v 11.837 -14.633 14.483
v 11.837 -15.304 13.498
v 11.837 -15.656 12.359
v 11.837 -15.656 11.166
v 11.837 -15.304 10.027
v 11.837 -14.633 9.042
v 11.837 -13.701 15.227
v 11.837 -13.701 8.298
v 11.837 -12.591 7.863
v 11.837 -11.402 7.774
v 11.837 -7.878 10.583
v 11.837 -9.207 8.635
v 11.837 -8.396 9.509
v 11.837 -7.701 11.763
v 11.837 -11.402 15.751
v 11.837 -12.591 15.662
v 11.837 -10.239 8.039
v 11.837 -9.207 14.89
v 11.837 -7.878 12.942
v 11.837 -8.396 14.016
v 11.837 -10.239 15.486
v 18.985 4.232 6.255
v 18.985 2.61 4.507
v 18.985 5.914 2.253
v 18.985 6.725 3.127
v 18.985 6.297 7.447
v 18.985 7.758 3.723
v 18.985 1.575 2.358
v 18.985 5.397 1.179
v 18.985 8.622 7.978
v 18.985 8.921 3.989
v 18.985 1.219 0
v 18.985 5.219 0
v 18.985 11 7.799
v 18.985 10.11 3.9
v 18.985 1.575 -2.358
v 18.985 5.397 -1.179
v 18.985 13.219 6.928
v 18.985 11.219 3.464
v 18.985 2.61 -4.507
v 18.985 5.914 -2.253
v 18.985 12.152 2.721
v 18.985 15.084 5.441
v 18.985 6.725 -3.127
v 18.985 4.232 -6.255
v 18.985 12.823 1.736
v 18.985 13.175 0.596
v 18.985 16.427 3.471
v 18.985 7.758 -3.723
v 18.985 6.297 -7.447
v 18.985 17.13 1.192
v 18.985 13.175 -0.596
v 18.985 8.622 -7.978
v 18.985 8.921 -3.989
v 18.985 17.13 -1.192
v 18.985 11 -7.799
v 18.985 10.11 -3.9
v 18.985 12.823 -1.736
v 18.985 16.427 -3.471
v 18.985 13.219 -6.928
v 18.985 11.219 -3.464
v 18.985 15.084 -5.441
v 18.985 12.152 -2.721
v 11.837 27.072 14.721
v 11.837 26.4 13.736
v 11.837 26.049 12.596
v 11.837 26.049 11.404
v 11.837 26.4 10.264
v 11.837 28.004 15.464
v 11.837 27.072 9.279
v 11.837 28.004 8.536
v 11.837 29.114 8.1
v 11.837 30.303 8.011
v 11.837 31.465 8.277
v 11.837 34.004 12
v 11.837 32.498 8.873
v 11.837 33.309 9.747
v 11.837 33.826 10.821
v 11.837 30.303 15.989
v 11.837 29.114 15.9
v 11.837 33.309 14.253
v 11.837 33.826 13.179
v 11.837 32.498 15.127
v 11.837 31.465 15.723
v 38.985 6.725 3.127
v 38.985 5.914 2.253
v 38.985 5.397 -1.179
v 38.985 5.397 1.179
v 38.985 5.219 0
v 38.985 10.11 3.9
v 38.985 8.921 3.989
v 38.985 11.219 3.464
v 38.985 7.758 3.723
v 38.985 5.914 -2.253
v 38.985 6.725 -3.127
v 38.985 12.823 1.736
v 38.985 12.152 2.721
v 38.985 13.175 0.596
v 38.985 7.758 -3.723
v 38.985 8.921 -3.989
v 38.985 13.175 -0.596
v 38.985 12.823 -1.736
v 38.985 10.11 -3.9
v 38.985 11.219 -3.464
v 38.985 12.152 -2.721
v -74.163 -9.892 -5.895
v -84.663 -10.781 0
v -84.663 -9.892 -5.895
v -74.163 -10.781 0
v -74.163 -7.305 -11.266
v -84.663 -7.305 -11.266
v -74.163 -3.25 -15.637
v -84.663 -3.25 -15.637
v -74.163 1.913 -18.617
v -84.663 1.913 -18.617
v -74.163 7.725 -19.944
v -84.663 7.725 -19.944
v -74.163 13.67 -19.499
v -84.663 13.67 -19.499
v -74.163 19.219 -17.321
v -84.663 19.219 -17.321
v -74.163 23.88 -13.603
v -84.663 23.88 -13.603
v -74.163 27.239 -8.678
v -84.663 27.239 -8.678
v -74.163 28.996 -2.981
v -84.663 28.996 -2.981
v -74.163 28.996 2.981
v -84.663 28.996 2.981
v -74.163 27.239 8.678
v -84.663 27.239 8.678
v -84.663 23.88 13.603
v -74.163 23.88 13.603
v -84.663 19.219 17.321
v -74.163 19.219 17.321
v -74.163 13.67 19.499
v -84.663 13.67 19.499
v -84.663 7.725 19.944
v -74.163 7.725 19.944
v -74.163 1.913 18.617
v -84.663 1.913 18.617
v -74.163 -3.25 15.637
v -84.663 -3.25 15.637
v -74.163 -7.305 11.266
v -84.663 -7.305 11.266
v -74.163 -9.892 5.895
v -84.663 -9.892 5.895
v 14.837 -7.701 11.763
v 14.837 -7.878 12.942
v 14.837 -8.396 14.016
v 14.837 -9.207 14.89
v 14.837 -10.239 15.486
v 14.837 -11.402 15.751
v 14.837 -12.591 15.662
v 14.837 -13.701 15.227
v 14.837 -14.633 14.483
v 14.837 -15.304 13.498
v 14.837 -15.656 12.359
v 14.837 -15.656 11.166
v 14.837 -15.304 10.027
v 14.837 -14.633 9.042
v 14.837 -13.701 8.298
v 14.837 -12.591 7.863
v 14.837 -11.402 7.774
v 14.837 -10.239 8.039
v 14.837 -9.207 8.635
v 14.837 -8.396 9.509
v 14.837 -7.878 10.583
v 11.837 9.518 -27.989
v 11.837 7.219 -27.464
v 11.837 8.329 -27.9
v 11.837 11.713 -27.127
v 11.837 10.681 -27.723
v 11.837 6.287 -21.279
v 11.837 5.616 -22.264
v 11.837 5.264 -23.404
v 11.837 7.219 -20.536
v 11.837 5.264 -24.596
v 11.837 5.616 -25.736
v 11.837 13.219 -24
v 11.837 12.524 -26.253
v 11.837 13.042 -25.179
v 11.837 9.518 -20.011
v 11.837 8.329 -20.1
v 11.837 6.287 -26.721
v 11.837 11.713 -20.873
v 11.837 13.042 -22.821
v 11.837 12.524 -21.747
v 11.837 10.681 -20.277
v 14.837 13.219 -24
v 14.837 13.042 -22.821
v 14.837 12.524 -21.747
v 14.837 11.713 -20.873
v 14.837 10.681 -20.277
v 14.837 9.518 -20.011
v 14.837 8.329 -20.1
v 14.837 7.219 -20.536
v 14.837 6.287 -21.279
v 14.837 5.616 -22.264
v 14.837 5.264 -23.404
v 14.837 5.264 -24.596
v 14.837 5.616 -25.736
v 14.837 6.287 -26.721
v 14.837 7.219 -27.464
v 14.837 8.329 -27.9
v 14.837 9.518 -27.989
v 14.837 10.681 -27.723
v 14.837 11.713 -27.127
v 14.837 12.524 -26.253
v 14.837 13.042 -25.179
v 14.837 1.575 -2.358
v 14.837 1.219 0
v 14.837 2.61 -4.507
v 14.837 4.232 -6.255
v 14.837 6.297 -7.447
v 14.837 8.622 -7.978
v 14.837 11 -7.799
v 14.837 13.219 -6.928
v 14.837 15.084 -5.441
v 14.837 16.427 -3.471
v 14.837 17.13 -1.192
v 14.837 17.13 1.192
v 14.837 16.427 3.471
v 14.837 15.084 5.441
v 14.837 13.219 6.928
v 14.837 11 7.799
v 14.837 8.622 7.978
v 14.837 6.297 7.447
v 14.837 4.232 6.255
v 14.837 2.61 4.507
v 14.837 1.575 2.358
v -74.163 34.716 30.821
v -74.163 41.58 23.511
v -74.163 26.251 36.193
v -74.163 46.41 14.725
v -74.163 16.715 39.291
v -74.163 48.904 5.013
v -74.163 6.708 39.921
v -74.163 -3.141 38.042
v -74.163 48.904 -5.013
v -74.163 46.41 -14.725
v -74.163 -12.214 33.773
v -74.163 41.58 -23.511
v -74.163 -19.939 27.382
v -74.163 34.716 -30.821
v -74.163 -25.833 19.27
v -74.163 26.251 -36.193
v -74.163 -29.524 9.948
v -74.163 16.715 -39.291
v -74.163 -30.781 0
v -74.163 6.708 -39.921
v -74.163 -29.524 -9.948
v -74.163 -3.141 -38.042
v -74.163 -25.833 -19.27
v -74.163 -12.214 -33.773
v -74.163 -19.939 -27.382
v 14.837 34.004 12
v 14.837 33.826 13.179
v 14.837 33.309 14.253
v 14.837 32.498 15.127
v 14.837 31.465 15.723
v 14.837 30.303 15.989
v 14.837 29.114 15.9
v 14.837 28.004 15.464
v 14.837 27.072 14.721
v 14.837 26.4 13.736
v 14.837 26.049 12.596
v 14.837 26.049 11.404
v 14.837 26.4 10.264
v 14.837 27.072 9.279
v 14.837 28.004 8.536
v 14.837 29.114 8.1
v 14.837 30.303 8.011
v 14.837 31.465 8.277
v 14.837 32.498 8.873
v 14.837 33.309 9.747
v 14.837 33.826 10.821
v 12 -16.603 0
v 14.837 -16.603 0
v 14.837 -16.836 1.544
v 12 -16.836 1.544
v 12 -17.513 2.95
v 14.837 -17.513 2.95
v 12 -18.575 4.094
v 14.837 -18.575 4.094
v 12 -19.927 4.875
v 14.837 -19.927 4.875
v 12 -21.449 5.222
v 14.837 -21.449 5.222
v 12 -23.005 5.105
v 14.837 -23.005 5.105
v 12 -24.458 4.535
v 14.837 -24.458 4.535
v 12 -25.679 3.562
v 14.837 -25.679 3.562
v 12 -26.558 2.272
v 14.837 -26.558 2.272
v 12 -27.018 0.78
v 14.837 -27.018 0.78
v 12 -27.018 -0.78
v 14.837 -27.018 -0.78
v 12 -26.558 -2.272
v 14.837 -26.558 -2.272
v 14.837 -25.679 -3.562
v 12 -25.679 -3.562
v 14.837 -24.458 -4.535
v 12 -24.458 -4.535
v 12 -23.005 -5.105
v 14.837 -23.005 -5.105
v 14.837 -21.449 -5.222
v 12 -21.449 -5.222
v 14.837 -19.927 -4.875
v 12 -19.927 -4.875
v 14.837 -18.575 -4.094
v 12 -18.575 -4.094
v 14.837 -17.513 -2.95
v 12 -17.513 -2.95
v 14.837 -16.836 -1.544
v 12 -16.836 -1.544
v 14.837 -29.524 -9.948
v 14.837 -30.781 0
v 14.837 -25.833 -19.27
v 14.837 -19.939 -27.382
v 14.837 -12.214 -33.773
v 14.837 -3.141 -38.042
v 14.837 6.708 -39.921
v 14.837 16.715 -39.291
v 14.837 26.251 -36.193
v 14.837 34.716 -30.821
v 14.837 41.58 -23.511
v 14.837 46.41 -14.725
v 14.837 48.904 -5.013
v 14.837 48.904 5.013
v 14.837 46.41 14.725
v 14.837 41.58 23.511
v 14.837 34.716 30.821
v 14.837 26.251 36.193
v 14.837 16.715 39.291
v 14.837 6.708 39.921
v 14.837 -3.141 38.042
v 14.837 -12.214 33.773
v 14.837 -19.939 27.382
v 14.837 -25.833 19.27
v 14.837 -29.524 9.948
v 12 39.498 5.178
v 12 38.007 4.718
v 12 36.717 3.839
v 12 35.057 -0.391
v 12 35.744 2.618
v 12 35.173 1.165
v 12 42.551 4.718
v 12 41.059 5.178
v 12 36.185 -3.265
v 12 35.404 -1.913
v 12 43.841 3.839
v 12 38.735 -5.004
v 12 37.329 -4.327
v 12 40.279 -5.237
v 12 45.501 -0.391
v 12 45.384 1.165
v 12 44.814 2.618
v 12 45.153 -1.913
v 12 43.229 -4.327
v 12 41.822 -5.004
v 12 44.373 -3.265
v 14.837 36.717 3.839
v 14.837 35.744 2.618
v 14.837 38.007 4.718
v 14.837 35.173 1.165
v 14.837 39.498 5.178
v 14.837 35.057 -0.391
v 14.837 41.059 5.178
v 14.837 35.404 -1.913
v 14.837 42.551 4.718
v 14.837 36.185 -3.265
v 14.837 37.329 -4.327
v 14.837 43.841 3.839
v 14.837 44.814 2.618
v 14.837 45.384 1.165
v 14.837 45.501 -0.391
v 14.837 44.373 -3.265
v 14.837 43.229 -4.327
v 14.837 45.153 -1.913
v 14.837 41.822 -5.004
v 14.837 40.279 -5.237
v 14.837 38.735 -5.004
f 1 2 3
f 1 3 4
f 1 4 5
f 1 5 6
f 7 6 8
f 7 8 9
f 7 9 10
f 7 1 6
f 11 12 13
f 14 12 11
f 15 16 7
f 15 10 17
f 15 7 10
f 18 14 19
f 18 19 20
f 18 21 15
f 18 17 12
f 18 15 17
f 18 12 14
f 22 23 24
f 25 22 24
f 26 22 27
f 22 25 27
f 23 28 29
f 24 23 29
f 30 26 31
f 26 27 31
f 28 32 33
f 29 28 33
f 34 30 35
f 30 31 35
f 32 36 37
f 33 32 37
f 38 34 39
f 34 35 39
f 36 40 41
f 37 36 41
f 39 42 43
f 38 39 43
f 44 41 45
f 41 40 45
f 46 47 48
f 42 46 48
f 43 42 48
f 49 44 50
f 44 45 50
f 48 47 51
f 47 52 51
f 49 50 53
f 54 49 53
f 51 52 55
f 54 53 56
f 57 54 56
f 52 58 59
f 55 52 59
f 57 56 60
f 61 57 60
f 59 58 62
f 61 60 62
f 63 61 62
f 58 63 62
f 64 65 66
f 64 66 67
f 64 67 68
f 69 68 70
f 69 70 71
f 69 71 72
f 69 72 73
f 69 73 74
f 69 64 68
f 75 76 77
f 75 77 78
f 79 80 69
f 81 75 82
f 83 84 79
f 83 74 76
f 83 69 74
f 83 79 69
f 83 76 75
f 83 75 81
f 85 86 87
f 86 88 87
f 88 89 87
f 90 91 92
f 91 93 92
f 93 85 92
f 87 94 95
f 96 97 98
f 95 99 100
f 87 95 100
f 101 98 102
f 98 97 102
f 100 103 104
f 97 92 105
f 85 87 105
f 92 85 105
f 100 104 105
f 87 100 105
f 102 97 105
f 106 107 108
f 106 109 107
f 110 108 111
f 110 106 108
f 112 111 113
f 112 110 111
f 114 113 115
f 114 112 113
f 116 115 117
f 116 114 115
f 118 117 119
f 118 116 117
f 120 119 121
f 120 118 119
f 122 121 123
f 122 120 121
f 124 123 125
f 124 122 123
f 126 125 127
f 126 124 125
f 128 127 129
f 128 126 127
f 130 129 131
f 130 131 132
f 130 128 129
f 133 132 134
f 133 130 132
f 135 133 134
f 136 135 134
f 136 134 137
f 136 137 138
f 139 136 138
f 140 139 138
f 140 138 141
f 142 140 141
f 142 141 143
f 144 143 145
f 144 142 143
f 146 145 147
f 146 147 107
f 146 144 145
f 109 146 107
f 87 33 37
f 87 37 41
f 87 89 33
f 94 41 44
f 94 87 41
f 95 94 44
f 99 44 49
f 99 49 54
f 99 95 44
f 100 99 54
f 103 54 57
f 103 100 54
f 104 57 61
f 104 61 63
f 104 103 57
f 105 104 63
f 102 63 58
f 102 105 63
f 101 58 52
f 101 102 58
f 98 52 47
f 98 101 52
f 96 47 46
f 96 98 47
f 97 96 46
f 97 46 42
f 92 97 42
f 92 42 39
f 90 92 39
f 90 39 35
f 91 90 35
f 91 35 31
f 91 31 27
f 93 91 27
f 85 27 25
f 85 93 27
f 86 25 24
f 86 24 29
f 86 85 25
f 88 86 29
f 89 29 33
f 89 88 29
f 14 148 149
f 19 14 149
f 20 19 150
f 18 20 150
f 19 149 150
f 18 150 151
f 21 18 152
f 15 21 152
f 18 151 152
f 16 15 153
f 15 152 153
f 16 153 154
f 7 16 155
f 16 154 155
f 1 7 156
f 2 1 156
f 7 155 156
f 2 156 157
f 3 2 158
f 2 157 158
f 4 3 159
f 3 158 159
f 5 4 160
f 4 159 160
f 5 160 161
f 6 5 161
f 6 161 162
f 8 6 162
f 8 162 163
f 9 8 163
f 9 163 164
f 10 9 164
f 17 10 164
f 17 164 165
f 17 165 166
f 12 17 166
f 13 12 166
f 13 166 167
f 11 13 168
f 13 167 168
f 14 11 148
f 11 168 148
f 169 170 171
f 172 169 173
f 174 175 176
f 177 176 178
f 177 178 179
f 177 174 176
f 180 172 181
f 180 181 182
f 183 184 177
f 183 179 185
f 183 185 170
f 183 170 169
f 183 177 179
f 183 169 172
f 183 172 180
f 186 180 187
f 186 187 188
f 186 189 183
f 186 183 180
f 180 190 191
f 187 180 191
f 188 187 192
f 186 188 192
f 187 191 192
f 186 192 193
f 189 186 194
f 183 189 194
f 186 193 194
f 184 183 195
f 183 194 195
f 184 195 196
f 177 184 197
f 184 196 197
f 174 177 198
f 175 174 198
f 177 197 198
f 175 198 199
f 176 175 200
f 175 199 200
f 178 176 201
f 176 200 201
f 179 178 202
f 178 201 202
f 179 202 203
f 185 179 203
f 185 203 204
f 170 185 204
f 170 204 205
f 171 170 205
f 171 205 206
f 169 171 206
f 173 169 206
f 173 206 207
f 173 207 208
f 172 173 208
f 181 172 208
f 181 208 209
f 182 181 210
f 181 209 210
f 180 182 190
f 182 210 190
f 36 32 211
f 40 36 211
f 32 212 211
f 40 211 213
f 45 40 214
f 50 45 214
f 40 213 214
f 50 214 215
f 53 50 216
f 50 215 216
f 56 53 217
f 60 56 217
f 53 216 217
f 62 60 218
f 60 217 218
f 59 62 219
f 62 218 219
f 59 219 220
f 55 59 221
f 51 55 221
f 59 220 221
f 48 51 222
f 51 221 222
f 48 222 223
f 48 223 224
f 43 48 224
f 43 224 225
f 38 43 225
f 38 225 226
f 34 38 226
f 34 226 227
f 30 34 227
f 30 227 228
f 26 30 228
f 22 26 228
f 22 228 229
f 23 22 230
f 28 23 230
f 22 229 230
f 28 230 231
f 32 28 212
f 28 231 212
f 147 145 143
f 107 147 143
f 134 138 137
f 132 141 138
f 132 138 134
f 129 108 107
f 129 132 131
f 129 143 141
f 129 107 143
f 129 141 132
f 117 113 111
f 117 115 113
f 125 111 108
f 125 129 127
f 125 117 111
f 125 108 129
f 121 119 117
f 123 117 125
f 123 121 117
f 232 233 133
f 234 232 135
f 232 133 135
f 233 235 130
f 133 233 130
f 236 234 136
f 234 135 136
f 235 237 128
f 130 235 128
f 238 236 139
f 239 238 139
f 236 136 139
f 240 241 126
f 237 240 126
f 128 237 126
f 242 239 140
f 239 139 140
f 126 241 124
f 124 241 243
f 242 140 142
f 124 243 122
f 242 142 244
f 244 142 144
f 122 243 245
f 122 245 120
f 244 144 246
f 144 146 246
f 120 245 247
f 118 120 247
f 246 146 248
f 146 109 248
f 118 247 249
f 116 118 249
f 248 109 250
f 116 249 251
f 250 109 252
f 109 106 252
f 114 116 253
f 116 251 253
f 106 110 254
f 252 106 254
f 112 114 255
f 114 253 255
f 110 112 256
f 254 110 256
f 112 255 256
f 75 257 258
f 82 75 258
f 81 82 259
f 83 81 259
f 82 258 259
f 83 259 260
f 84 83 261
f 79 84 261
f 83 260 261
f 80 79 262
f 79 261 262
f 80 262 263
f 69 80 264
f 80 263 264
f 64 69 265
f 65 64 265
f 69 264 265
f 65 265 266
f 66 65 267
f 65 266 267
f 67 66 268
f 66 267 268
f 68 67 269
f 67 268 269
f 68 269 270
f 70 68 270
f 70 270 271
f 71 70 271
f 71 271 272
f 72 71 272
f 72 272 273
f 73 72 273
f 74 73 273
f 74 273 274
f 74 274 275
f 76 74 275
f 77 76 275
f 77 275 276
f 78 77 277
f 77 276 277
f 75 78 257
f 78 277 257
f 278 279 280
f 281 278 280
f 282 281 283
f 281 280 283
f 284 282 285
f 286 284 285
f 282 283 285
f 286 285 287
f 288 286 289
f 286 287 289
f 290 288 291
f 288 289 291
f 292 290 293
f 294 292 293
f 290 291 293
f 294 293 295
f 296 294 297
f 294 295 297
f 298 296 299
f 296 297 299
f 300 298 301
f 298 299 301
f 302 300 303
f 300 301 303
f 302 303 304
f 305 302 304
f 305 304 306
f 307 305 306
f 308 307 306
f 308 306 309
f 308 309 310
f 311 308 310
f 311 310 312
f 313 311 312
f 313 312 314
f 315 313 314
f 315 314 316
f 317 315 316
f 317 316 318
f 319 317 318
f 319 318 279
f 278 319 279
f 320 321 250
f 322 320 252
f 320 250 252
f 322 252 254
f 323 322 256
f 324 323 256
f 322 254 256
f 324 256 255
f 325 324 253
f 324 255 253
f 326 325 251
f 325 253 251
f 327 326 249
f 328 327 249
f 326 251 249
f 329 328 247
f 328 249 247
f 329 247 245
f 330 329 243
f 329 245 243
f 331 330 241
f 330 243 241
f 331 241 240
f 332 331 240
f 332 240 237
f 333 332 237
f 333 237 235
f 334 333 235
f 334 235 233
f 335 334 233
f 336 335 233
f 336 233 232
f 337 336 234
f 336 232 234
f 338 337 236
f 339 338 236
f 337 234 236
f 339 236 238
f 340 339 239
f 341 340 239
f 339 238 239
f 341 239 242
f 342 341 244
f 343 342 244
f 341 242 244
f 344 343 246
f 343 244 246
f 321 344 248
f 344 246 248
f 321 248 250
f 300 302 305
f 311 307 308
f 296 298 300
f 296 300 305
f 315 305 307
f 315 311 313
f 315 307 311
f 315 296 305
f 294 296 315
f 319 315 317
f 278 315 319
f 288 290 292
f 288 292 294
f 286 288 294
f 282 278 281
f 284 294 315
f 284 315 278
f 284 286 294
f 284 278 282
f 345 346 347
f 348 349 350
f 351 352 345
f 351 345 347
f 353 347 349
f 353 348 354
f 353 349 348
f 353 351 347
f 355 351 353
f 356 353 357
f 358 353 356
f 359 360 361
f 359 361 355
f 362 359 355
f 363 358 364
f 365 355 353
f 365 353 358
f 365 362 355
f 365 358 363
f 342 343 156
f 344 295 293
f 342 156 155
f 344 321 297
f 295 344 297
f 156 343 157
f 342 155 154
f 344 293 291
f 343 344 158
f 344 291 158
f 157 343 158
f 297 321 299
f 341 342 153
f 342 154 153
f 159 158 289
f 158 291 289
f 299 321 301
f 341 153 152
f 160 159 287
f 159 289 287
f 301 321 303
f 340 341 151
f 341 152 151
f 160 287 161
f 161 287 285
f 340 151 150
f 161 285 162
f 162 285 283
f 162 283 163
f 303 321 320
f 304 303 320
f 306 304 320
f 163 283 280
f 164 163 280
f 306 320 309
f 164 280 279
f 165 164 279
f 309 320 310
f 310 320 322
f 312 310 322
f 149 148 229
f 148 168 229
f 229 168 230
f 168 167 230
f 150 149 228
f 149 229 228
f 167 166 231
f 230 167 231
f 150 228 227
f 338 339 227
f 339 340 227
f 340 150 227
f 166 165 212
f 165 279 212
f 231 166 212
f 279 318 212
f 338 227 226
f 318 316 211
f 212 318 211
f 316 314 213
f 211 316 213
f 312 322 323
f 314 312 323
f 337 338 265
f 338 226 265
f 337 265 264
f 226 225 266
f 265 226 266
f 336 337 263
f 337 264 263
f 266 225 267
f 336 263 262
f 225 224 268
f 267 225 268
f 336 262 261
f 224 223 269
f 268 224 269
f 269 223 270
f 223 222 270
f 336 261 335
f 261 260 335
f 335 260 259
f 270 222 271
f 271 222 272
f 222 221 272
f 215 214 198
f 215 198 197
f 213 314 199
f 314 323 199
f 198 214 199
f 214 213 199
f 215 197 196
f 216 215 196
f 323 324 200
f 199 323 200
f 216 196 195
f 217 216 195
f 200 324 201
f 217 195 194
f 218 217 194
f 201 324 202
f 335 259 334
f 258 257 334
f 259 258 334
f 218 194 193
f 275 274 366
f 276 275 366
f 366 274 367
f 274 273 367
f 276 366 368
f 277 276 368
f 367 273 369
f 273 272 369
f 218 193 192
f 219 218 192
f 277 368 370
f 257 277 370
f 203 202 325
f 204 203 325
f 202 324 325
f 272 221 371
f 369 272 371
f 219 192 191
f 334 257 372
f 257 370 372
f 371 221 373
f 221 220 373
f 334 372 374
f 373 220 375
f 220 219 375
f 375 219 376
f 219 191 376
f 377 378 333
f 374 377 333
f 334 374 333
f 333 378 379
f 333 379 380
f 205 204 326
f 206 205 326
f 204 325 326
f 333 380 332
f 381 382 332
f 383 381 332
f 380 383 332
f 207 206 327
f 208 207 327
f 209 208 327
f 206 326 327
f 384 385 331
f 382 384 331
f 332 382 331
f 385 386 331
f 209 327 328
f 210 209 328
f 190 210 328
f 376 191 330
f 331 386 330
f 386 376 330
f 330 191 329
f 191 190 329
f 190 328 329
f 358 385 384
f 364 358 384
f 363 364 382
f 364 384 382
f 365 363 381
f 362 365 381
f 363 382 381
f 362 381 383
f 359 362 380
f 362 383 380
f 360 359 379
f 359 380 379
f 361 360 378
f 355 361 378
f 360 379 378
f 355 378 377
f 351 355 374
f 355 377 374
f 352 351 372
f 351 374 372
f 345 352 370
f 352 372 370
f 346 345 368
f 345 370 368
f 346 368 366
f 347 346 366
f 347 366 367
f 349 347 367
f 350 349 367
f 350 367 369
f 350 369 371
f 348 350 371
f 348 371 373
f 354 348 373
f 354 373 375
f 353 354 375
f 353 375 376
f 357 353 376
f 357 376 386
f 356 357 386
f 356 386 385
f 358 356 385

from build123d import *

# Parameters (mm, degrees)
SKETCH1_W          = 10.5
SKETCH1_H          = 20
SKETCH1_W_2        = 73.726566952
SKETCH1_H_2        = 40
SKETCH1_W_3        = 20
SKETCH1_H_3        = 4
SKETCH4_R          = 5.236569571
CUT_EXTRUDE3_DEPTH = 3
SKETCH7_R          = 4
CUT_EXTRUDE4_DEPTH = 3


with BuildPart() as part:
    # Sketch1 → Revolve2 (revolve)
    with BuildSketch(Plane.XY, mode=Mode.PRIVATE) as revolve2_sk:
        with Locations((-79.413135593, 19.219422603)):
            Rectangle(SKETCH1_W, SKETCH1_H)
        Polygon((-66.795719354, 49.219422603), (-74.163135593, 49.219422603), (-74.163135593, 29.219422603), (-74.163135593, 9.219422603), (-66.795719354, 9.219422603), align=None)
        with Locations((-29.932435878, 29.219422603)):
            Rectangle(SKETCH1_W_2, SKETCH1_H_2)
        Polygon((14.836864407, 49.219422603), (6.930847598, 49.219422603), (6.930847598, 9.219422603), (14.836864407, 9.219422603), (14.836864407, 17.219422603), align=None)
        Polygon((18.985169492, 17.219422603), (14.836864407, 17.219422603), (14.836864407, 9.219422603), (18.985169492, 9.219422603), (18.985169492, 13.219422603), align=None)
        with Locations((28.985169492, 11.219422603)):
            Rectangle(SKETCH1_W_3, SKETCH1_H_3)
    revolve(revolve2_sk.sketch.rotate(Axis((-107.444319021, 9.219422603, 0), (1, 0, 0)), 180), axis=Axis((-107.444319021, 9.219422603, 0), (1, 0, 0)))

    # Sketch4 → Cut-Extrude3 (cut)
    with BuildSketch(Plane(origin=(15, 0, 0), x_dir=(0, 0, -1), z_dir=(1, 0, 0))):
        with Locations((0, 40.278768816)):
            Circle(SKETCH4_R)
        with Locations(Location((0, -21.839923611, 0), (0, 0, 90))):
            Circle(SKETCH4_R)
    extrude(amount=-CUT_EXTRUDE3_DEPTH, mode=Mode.SUBTRACT)

    # Sketch7 → Cut-Extrude4 (cut)
    with BuildSketch(Plane(origin=(14.836864407, 0, 0), x_dir=(0, 0, -1), z_dir=(1, 0, 0))):
        with Locations(Location((-11.762505522, -11.700507222, 0), (0, 0, 90))):
            Circle(SKETCH7_R)
        with Locations(Location((-12, 30.004032293, 0), (0, 0, 90))):
            Circle(SKETCH7_R)
        with Locations(Location((24, 9.219422603, 0), (0, 0, 90))):
            Circle(SKETCH7_R)
    extrude(amount=-CUT_EXTRUDE4_DEPTH, mode=Mode.SUBTRACT)


solid = part.part
